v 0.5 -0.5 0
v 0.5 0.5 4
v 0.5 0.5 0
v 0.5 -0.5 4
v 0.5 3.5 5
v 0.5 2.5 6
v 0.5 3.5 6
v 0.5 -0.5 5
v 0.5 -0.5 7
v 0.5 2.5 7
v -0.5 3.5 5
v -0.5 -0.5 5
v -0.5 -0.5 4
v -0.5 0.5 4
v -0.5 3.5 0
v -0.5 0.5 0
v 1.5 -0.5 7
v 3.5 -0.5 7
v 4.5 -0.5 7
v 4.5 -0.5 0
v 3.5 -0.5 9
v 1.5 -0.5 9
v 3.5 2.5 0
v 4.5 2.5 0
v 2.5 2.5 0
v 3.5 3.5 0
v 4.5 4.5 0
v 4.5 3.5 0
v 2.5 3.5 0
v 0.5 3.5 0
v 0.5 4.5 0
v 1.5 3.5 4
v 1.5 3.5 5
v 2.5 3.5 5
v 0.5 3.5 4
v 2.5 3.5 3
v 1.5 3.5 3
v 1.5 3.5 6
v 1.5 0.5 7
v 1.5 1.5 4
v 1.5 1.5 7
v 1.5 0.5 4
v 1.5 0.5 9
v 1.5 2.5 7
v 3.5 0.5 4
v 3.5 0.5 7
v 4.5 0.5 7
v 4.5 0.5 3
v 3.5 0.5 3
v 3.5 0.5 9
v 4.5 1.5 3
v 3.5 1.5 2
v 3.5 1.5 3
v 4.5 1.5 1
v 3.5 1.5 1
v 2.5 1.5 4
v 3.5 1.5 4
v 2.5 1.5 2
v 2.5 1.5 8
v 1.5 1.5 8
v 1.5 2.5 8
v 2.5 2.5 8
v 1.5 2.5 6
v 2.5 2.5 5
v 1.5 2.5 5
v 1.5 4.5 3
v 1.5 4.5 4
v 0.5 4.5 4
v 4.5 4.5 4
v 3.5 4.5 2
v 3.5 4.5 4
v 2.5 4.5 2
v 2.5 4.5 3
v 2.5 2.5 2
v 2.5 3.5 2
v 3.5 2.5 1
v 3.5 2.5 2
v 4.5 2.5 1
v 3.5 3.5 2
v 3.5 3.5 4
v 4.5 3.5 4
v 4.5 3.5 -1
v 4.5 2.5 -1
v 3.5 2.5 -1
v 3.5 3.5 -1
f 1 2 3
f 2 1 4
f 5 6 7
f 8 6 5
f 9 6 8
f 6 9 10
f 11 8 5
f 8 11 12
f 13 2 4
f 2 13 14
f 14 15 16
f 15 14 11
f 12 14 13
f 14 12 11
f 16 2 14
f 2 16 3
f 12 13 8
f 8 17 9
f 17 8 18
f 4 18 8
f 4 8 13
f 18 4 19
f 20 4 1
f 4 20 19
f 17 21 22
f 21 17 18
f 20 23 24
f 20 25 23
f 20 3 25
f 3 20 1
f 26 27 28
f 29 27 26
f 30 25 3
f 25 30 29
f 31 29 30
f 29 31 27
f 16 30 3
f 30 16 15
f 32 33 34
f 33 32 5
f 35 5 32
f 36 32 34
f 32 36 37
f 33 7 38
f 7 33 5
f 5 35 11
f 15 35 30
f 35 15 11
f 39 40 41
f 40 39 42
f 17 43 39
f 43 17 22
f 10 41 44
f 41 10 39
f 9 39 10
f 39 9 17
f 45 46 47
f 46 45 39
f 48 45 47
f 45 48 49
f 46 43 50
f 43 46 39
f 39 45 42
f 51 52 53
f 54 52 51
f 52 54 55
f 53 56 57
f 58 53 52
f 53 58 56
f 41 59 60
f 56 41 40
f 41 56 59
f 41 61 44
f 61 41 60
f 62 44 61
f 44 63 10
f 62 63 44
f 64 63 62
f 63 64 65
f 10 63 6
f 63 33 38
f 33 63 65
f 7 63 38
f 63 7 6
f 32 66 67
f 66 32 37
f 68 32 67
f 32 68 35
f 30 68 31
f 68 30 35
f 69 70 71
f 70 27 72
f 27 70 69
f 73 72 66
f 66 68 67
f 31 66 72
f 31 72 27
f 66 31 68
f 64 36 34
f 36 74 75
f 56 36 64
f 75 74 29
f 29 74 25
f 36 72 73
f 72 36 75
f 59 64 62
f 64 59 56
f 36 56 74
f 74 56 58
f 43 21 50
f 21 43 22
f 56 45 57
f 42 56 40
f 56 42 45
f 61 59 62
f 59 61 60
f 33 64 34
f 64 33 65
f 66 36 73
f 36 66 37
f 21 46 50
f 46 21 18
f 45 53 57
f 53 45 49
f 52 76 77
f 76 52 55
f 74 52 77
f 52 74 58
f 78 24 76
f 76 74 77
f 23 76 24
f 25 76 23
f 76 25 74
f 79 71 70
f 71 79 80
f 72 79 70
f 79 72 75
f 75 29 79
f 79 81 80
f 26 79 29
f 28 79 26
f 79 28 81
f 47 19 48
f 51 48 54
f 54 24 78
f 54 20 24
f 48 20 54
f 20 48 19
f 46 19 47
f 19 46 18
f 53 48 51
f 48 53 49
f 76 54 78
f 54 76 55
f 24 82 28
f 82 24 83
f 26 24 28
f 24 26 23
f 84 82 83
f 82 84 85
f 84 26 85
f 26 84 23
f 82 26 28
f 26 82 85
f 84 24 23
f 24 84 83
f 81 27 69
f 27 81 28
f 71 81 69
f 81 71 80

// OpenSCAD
union() {
    translate([0, 0, 4.5]) color([1, 0, 0]) cube([1, 1, 1], center=true);
    translate([0, 1, 2.5]) cube([1, 1, 5], center=true);
    translate([0, 2, 2.5]) cube([1, 1, 5], center=true);
    translate([0, 3, 2.5]) cube([1, 1, 5], center=true);
    translate([1, 0, 3.5]) cube([1, 1, 7], center=true);
    translate([1, 1, 3.5]) cube([1, 1, 7], center=true);
    translate([1, 2, 3.5]) cube([1, 1, 7], center=true);
    translate([1, 3, 3.0]) cube([1, 1, 6], center=true);
    translate([1, 4, 2.0]) cube([1, 1, 4], center=true);
    translate([2, 0, 4.5]) cube([1, 1, 9], center=true);
    translate([2, 1, 2.0]) cube([1, 1, 4], center=true);
    translate([2, 2, 4.0]) cube([1, 1, 8], center=true);
    translate([2, 3, 2.5]) cube([1, 1, 5], center=true);
    translate([2, 4, 1.5]) cube([1, 1, 3], center=true);
    translate([3, 0, 4.5]) cube([1, 1, 9], center=true);
    translate([3, 1, 2.0]) cube([1, 1, 4], center=true);
    translate([3, 2, 1.0]) cube([1, 1, 2], center=true);
    translate([3, 4, 1.0]) cube([1, 1, 2], center=true);
    translate([4, 0, 3.5]) cube([1, 1, 7], center=true);
    translate([4, 1, 1.5]) cube([1, 1, 3], center=true);
    translate([4, 2, 0.5]) cube([1, 1, 1], center=true);
    translate([4, 3, -0.5]) color([0, 0, 1]) cube([1, 1, 1], center=true);
    translate([4, 4, 2.0]) cube([1, 1, 4], center=true);
}
